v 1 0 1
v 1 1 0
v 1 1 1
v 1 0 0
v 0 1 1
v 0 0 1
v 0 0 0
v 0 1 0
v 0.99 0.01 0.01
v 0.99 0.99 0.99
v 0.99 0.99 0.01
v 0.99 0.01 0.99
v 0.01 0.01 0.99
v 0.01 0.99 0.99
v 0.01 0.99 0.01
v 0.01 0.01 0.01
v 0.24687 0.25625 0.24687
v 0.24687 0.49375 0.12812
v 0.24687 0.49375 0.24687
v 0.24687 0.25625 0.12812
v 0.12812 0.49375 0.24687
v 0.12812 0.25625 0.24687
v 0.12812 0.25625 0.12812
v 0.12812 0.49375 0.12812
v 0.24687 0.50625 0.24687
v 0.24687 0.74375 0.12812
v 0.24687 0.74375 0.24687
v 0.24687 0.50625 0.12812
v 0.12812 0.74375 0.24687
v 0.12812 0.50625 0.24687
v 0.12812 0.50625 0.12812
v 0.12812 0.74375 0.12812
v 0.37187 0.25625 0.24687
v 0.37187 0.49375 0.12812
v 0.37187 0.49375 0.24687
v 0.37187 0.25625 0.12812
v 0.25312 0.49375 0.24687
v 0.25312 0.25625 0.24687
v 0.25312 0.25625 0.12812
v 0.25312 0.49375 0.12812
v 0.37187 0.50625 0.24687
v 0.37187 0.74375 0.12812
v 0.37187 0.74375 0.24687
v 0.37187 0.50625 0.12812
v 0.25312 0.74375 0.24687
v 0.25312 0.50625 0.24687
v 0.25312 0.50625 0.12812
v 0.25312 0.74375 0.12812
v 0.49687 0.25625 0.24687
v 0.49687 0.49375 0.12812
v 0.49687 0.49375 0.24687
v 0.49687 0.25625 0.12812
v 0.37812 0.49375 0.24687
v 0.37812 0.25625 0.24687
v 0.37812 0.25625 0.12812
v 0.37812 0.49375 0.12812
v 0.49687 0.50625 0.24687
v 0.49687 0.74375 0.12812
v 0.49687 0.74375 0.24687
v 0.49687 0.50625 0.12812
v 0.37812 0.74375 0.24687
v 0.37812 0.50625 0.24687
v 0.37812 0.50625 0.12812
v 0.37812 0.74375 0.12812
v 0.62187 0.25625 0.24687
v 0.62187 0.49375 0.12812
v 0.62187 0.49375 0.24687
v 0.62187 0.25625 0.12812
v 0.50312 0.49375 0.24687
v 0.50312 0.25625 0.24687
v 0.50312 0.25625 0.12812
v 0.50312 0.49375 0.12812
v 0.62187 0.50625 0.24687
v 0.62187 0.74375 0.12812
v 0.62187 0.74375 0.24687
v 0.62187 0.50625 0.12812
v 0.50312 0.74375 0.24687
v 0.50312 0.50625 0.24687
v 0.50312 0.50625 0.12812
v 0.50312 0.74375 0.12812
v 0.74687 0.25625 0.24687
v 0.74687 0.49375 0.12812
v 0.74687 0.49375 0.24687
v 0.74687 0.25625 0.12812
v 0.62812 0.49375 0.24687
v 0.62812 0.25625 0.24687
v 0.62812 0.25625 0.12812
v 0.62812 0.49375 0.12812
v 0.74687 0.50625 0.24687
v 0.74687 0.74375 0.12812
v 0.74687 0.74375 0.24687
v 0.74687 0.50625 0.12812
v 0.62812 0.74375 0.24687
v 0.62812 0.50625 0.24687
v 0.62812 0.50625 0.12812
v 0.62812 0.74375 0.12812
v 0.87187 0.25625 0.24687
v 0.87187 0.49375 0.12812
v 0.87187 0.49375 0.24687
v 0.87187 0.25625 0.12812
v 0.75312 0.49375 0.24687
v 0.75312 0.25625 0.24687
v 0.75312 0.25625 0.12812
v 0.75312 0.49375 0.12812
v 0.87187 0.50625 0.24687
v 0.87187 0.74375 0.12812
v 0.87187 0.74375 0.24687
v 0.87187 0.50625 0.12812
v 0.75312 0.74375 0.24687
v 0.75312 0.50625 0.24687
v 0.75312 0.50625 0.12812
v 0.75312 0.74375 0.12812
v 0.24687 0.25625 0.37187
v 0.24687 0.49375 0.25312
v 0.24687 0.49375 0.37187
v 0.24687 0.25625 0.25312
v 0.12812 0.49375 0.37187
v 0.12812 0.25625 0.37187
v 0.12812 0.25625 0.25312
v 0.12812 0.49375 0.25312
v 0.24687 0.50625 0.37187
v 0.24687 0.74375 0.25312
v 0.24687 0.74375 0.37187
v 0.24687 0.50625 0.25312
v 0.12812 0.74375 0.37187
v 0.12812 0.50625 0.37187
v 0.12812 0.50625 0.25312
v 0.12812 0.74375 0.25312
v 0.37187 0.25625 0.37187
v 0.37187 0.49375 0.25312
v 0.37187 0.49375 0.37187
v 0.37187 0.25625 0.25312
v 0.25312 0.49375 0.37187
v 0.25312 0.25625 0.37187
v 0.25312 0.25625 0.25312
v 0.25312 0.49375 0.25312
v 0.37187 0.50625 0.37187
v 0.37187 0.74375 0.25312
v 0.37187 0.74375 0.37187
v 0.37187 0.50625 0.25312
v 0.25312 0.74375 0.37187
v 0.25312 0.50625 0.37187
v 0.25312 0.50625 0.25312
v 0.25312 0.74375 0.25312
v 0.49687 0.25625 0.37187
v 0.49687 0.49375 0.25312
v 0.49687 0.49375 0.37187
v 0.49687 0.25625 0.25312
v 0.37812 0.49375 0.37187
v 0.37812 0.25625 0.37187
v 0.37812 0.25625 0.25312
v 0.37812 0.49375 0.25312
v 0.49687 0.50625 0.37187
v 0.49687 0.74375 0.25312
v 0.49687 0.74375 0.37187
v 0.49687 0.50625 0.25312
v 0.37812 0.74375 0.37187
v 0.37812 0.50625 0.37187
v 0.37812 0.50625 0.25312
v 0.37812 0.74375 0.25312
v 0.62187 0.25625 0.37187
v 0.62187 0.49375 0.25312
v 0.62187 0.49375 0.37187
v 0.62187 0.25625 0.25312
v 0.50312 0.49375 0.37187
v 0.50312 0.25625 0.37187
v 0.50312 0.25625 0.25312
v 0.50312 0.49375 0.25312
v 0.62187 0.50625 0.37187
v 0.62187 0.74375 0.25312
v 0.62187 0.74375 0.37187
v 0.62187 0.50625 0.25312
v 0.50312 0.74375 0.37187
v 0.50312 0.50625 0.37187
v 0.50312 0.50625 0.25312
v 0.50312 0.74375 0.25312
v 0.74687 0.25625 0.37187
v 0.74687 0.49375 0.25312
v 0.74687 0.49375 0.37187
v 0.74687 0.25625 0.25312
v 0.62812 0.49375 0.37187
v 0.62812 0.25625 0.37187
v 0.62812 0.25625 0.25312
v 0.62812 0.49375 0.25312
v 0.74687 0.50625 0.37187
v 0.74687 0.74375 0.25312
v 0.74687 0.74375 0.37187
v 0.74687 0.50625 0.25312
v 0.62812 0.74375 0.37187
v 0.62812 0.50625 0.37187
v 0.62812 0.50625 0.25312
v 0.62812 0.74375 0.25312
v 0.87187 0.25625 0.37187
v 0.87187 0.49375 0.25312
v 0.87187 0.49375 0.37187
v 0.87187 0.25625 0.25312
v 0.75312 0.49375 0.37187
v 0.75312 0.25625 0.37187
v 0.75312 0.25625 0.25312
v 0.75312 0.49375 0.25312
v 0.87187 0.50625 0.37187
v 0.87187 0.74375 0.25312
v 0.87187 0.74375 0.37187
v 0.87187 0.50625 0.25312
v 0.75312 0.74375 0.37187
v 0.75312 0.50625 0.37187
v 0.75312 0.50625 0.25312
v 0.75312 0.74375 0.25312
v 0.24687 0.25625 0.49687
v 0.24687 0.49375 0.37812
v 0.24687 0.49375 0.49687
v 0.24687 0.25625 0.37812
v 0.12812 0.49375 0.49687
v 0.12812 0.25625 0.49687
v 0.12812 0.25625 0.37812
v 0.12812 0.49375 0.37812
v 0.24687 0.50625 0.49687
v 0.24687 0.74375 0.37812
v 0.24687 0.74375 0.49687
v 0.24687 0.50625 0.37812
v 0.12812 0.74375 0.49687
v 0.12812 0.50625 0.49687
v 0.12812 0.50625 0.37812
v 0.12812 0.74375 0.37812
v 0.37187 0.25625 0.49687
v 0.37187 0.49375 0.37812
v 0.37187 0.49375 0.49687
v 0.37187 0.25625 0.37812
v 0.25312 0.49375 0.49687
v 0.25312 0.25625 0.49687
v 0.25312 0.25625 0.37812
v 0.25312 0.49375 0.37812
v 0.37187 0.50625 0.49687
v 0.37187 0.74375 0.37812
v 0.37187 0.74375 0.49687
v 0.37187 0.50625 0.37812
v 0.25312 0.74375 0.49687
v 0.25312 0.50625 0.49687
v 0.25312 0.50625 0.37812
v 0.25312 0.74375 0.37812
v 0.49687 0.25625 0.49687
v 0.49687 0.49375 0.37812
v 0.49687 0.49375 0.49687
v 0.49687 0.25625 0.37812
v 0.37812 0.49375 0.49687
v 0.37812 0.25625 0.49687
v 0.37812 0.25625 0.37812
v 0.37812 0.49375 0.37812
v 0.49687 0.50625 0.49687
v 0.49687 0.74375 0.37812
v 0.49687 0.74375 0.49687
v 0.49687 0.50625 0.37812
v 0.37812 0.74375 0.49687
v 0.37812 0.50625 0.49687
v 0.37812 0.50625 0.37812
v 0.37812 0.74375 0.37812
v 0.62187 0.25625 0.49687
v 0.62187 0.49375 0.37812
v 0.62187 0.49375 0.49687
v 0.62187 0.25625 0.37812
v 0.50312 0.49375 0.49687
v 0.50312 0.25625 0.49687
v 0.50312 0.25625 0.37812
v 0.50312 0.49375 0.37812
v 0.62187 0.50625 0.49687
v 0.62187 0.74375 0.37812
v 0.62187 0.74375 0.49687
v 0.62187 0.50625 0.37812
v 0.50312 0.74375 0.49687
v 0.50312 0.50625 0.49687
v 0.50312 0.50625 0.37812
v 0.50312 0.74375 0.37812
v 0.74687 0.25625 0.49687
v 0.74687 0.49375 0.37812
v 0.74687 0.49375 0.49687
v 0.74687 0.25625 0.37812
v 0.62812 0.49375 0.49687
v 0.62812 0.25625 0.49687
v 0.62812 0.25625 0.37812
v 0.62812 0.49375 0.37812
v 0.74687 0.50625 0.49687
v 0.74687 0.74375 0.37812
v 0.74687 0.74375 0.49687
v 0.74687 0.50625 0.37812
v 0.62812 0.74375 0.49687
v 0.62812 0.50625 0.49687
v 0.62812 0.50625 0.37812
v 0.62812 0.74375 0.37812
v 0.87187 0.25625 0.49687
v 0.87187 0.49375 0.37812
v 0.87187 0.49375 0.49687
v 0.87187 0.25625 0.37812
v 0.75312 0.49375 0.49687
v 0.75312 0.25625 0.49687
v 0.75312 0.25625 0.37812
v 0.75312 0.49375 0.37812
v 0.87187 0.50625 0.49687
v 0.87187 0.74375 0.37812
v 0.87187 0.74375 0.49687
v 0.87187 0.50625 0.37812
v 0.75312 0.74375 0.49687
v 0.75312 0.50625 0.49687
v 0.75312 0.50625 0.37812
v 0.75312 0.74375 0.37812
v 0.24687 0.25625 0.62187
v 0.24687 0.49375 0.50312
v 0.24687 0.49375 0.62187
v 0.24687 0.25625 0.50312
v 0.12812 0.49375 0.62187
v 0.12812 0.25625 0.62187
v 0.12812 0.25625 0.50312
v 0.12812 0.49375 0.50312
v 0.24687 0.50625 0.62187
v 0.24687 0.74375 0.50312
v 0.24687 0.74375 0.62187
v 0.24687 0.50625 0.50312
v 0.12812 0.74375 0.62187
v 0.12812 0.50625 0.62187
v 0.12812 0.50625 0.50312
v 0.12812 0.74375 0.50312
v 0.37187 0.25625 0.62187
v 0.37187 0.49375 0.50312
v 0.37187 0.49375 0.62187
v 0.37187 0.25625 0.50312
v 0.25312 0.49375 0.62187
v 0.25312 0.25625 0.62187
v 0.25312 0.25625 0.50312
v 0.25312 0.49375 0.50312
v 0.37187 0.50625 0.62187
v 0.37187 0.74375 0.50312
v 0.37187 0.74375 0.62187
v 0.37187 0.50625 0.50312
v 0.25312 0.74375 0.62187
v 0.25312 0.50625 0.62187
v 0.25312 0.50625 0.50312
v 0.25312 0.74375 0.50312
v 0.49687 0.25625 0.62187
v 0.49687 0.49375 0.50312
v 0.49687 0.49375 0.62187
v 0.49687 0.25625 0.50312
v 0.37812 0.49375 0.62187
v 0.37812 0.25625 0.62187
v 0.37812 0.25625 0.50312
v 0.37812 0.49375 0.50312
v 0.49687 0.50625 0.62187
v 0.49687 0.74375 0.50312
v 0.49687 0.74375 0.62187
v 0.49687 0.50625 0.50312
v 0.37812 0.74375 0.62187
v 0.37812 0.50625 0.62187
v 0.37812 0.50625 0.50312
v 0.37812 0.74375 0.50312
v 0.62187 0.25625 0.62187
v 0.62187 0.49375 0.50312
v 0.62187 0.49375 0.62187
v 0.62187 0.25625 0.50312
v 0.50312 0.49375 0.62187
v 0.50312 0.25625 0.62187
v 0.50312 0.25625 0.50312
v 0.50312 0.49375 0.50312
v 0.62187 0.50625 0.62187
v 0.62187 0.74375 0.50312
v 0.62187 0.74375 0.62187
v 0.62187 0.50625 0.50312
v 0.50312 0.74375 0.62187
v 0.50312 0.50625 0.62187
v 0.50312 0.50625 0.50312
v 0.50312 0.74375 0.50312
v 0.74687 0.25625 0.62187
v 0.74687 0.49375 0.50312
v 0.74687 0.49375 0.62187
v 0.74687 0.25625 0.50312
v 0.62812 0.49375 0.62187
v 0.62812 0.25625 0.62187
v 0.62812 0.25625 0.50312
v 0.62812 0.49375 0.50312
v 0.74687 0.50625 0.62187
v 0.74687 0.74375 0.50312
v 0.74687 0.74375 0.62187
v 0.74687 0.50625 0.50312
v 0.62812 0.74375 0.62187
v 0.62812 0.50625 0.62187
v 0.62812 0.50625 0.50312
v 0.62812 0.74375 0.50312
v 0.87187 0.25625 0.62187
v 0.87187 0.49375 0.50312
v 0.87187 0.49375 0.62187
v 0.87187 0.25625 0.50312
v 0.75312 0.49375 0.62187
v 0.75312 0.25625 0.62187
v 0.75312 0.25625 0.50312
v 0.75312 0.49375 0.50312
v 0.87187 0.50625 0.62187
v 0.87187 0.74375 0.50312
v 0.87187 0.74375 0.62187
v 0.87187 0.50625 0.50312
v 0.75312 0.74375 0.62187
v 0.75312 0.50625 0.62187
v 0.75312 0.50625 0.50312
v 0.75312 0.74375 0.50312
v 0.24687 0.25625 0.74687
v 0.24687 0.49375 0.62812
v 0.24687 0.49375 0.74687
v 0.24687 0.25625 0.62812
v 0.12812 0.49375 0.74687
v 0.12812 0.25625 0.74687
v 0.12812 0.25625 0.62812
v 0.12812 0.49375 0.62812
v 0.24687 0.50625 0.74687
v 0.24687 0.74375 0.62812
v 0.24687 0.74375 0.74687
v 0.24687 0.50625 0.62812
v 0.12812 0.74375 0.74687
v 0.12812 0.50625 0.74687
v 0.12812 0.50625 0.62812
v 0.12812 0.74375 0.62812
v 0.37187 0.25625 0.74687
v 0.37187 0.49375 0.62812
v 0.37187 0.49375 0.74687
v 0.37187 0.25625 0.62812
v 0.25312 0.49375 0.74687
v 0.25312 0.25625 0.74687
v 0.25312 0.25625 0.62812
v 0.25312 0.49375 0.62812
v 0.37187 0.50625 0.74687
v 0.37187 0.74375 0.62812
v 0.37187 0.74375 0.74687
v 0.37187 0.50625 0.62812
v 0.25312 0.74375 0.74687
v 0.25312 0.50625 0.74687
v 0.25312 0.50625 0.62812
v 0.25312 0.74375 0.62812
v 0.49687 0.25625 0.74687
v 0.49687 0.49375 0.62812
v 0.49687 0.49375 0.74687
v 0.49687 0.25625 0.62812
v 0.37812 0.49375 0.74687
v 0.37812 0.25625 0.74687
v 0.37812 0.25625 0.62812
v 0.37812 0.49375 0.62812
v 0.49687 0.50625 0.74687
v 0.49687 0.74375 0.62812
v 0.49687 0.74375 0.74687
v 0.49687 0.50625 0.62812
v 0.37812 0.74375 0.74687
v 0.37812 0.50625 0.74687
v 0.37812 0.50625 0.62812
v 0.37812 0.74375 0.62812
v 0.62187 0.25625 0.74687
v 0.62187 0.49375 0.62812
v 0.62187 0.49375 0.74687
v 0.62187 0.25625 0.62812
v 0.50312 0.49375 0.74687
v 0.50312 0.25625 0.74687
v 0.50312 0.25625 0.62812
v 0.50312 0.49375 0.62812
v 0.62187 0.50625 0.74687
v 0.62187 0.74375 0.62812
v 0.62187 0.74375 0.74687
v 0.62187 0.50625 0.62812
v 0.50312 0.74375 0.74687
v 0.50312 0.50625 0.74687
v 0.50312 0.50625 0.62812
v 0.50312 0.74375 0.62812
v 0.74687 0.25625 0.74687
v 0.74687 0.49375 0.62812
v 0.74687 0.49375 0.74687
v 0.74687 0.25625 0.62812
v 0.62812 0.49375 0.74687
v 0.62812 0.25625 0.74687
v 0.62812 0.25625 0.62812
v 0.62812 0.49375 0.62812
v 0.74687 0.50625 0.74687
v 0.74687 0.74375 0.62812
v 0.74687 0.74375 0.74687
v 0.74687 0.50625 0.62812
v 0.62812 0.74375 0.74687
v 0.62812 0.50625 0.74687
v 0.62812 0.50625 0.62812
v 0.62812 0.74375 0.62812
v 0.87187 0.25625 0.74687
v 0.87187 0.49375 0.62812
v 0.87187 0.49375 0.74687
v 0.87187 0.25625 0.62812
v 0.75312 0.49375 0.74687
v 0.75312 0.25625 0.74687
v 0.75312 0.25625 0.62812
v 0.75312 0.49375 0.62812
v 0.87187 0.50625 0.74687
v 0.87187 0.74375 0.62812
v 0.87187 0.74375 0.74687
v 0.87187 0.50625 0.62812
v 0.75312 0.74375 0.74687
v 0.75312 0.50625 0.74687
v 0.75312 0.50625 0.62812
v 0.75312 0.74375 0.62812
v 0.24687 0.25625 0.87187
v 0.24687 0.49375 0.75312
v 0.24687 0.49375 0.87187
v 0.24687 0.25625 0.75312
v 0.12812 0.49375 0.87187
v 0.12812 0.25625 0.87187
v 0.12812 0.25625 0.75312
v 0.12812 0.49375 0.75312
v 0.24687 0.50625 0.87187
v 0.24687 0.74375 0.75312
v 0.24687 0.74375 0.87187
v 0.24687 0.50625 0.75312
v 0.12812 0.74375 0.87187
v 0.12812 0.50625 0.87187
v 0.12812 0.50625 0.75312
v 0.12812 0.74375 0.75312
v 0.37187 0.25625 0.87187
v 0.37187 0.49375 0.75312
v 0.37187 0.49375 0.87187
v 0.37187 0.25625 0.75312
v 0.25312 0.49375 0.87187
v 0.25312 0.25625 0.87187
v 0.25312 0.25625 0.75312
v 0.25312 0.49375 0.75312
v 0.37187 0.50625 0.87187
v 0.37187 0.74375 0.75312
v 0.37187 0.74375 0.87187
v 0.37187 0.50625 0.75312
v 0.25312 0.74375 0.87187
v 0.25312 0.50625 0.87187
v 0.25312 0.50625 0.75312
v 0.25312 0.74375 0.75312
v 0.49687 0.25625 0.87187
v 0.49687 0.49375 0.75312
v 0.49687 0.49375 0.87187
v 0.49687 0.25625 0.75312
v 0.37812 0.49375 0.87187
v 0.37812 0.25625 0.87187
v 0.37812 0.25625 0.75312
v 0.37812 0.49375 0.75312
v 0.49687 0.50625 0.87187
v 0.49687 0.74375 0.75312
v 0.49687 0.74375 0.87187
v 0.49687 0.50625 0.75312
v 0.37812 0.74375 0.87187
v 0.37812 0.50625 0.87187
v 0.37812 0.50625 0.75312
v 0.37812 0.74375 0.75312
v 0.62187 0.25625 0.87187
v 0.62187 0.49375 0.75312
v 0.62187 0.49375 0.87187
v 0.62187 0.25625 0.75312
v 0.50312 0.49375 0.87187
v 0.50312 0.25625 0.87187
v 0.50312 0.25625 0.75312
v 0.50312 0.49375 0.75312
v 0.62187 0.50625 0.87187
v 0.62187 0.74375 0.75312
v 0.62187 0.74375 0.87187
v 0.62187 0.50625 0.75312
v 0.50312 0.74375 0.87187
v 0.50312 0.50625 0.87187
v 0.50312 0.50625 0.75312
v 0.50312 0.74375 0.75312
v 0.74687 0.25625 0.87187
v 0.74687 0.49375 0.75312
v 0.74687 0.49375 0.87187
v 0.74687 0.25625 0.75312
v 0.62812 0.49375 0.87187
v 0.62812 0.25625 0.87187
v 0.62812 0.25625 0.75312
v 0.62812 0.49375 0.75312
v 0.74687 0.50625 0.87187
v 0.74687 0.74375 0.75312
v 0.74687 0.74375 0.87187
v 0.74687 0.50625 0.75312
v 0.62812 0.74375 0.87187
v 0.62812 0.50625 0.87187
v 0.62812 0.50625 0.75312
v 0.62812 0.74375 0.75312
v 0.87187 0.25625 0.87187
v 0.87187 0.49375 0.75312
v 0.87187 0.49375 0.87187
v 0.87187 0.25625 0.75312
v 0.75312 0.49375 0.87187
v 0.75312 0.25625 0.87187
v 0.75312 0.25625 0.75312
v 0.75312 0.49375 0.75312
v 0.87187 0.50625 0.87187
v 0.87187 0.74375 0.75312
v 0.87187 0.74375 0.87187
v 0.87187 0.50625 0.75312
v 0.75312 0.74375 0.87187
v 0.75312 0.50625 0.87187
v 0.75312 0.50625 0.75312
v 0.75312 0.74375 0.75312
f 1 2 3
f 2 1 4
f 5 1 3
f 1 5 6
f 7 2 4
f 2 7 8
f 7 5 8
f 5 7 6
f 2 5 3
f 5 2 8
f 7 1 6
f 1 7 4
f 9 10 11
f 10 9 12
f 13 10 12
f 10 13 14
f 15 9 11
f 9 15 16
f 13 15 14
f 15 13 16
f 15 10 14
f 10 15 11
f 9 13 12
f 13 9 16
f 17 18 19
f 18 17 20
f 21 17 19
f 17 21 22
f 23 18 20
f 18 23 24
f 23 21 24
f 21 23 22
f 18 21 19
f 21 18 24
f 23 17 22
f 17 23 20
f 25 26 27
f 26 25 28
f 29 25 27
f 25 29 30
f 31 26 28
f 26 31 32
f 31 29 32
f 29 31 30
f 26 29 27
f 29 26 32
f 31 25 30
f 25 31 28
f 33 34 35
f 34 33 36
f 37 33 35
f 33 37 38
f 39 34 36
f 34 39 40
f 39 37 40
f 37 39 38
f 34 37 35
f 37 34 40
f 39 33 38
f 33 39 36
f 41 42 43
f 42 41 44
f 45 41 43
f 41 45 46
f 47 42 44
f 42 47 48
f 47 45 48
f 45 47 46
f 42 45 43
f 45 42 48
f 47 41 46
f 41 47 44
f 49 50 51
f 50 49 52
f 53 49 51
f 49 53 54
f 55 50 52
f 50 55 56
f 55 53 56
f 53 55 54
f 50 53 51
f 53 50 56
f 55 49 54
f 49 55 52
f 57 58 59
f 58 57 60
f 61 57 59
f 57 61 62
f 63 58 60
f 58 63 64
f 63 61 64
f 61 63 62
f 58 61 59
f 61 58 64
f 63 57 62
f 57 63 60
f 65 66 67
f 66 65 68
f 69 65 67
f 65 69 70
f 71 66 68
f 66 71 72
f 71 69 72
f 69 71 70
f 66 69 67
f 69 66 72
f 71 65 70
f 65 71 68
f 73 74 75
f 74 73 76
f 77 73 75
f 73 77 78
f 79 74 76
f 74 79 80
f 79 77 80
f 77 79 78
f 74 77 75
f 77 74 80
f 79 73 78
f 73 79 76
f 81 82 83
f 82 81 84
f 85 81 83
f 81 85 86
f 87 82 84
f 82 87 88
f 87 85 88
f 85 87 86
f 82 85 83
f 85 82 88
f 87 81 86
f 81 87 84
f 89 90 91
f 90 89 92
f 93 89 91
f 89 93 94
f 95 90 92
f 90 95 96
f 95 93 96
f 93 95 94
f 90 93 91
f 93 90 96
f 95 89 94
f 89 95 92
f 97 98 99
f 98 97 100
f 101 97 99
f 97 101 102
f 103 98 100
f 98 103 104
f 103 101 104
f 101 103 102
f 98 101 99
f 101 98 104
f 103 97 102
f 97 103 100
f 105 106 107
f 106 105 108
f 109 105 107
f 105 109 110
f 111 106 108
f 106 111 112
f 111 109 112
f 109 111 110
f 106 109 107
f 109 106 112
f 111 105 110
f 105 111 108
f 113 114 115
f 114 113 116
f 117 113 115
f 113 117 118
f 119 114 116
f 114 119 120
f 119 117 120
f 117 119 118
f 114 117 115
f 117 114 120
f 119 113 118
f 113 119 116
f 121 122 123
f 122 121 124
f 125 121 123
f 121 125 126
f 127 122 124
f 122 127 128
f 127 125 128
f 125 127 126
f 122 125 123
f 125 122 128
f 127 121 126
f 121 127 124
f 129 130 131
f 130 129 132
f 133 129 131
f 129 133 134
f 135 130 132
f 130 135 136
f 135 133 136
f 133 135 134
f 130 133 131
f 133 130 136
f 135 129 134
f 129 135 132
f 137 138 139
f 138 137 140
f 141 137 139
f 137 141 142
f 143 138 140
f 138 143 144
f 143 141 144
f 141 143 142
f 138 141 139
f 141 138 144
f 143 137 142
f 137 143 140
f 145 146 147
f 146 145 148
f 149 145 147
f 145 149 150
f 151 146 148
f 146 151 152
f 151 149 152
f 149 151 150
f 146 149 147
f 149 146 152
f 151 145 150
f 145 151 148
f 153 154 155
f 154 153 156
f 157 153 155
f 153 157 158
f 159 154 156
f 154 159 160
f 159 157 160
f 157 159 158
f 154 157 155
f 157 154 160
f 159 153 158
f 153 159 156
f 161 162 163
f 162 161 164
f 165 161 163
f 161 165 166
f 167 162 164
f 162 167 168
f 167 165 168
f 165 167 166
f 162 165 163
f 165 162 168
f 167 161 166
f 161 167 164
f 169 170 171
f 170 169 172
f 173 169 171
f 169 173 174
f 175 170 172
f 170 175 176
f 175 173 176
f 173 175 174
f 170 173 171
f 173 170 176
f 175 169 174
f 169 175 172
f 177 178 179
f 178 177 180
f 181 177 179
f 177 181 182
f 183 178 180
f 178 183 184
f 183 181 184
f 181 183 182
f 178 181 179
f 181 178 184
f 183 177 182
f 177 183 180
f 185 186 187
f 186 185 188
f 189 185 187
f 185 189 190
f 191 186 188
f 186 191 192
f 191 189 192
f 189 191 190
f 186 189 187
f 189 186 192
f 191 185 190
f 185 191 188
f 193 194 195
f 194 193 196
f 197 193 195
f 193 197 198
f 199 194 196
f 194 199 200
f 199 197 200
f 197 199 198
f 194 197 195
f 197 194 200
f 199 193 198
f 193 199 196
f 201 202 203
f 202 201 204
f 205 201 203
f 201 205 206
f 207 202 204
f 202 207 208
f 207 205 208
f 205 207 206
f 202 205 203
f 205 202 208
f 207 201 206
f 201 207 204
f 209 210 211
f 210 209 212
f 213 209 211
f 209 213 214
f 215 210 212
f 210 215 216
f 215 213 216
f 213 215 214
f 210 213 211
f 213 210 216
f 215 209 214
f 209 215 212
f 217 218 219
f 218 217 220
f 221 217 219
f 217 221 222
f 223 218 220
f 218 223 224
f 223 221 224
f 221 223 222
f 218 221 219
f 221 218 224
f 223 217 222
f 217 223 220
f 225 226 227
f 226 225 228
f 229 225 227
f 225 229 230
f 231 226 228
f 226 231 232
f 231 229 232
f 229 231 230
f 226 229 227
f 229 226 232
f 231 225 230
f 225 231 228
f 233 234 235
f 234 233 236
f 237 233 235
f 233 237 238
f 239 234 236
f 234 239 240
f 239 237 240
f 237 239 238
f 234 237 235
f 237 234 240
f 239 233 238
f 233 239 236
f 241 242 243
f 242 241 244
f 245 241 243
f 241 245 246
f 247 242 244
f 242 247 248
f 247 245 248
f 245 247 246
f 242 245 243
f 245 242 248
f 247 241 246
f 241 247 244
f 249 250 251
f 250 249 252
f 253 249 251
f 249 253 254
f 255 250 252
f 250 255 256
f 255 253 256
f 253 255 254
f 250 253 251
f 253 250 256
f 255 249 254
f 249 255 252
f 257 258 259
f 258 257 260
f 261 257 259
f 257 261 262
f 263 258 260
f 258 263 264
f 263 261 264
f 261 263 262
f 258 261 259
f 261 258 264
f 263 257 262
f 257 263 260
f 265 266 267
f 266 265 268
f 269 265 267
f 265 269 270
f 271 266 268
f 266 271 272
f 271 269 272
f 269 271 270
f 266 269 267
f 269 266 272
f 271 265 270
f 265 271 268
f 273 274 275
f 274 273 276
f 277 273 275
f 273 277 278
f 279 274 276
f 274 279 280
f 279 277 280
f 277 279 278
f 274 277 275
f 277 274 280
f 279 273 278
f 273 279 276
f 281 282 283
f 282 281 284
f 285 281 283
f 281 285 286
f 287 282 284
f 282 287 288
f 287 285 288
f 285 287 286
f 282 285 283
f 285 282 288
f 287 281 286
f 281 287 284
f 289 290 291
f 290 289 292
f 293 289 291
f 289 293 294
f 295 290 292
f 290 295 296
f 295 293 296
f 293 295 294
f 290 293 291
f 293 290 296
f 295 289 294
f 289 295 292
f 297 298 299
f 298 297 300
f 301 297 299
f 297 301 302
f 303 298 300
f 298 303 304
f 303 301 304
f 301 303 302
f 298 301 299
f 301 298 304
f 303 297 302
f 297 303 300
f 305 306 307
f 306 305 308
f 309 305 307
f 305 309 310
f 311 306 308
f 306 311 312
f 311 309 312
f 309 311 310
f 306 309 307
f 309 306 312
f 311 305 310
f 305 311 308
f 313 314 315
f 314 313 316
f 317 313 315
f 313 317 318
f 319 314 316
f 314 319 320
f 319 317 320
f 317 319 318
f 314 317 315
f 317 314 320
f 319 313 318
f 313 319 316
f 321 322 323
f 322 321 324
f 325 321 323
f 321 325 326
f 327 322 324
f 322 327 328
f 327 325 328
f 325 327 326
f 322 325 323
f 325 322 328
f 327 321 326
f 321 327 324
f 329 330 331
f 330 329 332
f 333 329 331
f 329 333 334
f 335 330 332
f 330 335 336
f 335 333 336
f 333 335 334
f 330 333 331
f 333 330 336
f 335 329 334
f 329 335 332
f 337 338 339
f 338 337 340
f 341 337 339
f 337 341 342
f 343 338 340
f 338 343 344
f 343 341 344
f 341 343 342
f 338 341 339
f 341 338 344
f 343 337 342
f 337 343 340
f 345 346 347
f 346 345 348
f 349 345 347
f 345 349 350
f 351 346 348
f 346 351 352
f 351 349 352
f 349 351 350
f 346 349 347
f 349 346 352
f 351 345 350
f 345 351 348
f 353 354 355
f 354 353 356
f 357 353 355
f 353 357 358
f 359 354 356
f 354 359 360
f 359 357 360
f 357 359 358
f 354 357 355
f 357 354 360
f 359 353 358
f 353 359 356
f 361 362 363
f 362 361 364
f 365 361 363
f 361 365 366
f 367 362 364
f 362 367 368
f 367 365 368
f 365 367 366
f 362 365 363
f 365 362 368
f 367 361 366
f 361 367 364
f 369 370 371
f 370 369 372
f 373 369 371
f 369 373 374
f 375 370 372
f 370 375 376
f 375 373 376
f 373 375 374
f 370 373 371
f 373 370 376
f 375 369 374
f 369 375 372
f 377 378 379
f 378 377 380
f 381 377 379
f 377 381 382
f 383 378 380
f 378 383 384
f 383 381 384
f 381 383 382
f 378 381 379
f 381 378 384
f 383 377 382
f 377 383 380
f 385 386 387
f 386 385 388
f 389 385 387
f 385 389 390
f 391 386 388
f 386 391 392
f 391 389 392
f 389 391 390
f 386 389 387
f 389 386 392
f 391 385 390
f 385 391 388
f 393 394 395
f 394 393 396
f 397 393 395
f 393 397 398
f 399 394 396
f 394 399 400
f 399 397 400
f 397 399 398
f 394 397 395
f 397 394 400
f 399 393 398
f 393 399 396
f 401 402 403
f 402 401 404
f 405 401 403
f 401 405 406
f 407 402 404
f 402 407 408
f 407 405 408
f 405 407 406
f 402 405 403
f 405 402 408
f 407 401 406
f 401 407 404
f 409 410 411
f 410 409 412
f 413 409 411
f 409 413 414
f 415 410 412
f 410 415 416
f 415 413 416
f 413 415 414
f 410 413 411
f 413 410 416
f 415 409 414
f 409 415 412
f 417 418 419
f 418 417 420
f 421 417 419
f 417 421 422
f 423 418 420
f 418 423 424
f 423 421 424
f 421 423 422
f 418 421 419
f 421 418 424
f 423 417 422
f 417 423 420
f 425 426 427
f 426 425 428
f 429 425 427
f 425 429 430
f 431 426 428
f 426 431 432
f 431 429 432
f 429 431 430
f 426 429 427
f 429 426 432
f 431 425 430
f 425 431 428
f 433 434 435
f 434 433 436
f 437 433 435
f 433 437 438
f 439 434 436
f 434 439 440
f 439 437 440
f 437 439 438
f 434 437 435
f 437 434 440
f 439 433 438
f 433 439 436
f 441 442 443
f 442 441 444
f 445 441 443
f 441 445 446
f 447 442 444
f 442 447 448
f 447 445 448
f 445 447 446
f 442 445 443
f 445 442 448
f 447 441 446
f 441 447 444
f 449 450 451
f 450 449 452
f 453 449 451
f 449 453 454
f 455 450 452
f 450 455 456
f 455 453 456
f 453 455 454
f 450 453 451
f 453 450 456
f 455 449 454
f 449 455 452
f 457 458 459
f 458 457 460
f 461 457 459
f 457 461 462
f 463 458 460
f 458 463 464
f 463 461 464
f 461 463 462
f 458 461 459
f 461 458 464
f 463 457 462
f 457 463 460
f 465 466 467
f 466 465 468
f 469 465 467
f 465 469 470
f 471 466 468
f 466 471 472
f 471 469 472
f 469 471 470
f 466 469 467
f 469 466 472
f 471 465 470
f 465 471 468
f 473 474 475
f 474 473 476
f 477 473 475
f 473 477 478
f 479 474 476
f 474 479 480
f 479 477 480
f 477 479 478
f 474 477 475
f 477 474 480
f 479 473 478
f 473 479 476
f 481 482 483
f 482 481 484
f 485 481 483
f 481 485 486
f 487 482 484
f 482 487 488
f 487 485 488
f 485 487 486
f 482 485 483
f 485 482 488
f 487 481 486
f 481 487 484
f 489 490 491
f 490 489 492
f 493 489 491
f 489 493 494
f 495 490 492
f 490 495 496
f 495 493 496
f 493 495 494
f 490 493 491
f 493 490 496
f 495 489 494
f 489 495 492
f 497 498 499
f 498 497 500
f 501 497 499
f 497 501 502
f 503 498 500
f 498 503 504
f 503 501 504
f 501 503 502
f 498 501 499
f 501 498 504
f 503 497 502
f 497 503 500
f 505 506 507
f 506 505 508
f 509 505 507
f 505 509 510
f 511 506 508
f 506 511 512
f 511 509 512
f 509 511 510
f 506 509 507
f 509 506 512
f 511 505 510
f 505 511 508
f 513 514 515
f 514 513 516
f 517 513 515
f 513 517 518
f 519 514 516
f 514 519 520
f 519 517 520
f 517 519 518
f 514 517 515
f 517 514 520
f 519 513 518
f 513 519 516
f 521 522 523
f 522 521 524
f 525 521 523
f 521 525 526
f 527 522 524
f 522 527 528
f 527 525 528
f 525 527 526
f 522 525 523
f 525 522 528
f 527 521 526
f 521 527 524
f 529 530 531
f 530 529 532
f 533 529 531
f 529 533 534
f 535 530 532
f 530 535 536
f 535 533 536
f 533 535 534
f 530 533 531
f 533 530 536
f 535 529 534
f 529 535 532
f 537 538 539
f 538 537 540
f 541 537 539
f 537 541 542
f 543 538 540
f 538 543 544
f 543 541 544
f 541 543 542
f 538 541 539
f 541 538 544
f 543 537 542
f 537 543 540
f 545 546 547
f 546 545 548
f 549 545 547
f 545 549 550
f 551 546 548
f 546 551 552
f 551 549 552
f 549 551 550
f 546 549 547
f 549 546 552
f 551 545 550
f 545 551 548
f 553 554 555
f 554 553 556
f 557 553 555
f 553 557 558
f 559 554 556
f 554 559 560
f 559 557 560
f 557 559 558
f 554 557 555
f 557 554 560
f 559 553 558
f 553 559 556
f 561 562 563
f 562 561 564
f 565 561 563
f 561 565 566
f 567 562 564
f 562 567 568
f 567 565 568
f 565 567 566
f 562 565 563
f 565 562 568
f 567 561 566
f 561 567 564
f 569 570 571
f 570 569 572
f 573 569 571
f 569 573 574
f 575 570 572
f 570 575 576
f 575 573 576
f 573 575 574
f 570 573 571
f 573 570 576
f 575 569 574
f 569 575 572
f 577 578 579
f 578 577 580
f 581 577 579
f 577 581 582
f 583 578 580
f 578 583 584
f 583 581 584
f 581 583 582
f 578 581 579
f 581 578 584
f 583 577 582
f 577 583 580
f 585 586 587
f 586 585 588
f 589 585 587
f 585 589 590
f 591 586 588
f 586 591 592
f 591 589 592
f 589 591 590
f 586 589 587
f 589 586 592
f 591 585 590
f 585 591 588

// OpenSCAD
translate([0.1875, 0.375, 0.1875]) color([0.5722195718955865, 0.184217002063086, 0.8342118832051438]) cube([0.11875, 0.2375, 0.11875], center=true);
translate([0.1875, 0.625, 0.1875]) color([0.26710224400295624, 0.08508716760269452, 0.3457541811054926]) cube([0.11875, 0.2375, 0.11875], center=true);
translate([0.3125, 0.375, 0.1875]) color([0.07476171000851672, 0.19279916790285045, 0.5504615810891126]) cube([0.11875, 0.2375, 0.11875], center=true);
translate([0.3125, 0.625, 0.1875]) color([0.09079597065111733, 0.40484827153990854, 0.7007931535607755]) cube([0.11875, 0.2375, 0.11875], center=true);
translate([0.4375, 0.375, 0.1875]) color([0.49403525384706204, 0.6510047853558598, 0.6429337830402005]) cube([0.11875, 0.2375, 0.11875], center=true);
translate([0.4375, 0.625, 0.1875]) color([0.2649187298750757, 0.27572483708494266, 0.5473052205769033]) cube([0.11875, 0.2375, 0.11875], center=true);
translate([0.5625, 0.375, 0.1875]) color([0.5661495725987926, 0.874404803529036, 0.20386709790345137]) cube([0.11875, 0.2375, 0.11875], center=true);
translate([0.5625, 0.625, 0.1875]) color([0.3418305511940324, 0.8878875246484472, 0.2801861345901735]) cube([0.11875, 0.2375, 0.11875], center=true);
translate([0.6875, 0.375, 0.1875]) color([0.1546149601754332, 0.3469401204031036, 0.3758367769097771]) cube([0.11875, 0.2375, 0.11875], center=true);
translate([0.6875, 0.625, 0.1875]) color([0.5318168981553145, 0.09181654034718201, 0.15494961168900667]) cube([0.11875, 0.2375, 0.11875], center=true);
translate([0.8125, 0.375, 0.1875]) color([0.23634427521391044, 0.3704107832232806, 0.487539209689296]) cube([0.11875, 0.2375, 0.11875], center=true);
translate([0.8125, 0.625, 0.1875]) color([0.6034976542650747, 0.2627310794437595, 0.4813767342813645]) cube([0.11875, 0.2375, 0.11875], center=true);
translate([0.1875, 0.375, 0.3125]) color([0.5946463261514235, 0.5048272534170117, 0.16573815981186668]) cube([0.11875, 0.2375, 0.11875], center=true);
translate([0.1875, 0.625, 0.3125]) color([0.5312064721990213, 0.3864707385879014, 0.6491346940979981]) cube([0.11875, 0.2375, 0.11875], center=true);
translate([0.3125, 0.375, 0.3125]) color([0.6930379086396479, 0.4966939974314175, 0.6630315309986013]) cube([0.11875, 0.2375, 0.11875], center=true);
translate([0.3125, 0.625, 0.3125]) color([0.13981308963283157, 0.47491123508258415, 0.9023476457984115]) cube([0.11875, 0.2375, 0.11875], center=true);
translate([0.4375, 0.375, 0.3125]) color([0.1931726699934797, 0.0031613604210096735, 0.6942741873712196]) cube([0.11875, 0.2375, 0.11875], center=true);
translate([0.4375, 0.625, 0.3125]) color([0.4143523561114393, 0.3646706267694394, 0.09478866737710545]) cube([0.11875, 0.2375, 0.11875], center=true);
translate([0.5625, 0.375, 0.3125]) color([0.02952248278908587, 0.06577547335008205, 0.2144514008829076]) cube([0.11875, 0.2375, 0.11875], center=true);
translate([0.5625, 0.625, 0.3125]) color([0.7343352544312742, 0.603990958460556, 0.9720313042525073]) cube([0.11875, 0.2375, 0.11875], center=true);
translate([0.6875, 0.375, 0.3125]) color([0.7807972976434698, 0.7764498464372257, 0.921763141345221]) cube([0.11875, 0.2375, 0.11875], center=true);
translate([0.6875, 0.625, 0.3125]) color([0.057080613367743394, 0.9909538408677715, 0.5964250008993118]) cube([0.11875, 0.2375, 0.11875], center=true);
translate([0.8125, 0.375, 0.3125]) color([0.07889841000546927, 0.7028197923162828, 0.6308852981512154]) cube([0.11875, 0.2375, 0.11875], center=true);
translate([0.8125, 0.625, 0.3125]) color([0.9993671244921081, 0.6127248764917053, 0.8343703456684616]) cube([0.11875, 0.2375, 0.11875], center=true);
translate([0.1875, 0.375, 0.4375]) color([0.37764138660031277, 0.7740498451771767, 0.4727699991249097]) cube([0.11875, 0.2375, 0.11875], center=true);
translate([0.1875, 0.625, 0.4375]) color([0.42951117613533696, 0.4948057107933499, 0.6721242531863842]) cube([0.11875, 0.2375, 0.11875], center=true);
translate([0.3125, 0.375, 0.4375]) color([0.4041489968292017, 0.6081990332733349, 0.10592311435848989]) cube([0.11875, 0.2375, 0.11875], center=true);
translate([0.3125, 0.625, 0.4375]) color([0.17046457513355695, 0.68509640591202, 0.25832902758732756]) cube([0.11875, 0.2375, 0.11875], center=true);
translate([0.4375, 0.375, 0.4375]) color([0.5827166907330694, 0.9734780100360324, 0.5142753815107834]) cube([0.11875, 0.2375, 0.11875], center=true);
translate([0.4375, 0.625, 0.4375]) color([0.8518460407990305, 0.7921792124086715, 0.9242627687794138]) cube([0.11875, 0.2375, 0.11875], center=true);
translate([0.5625, 0.375, 0.4375]) color([0.4222989312329084, 0.8256043248591103, 0.6866368897678596]) cube([0.11875, 0.2375, 0.11875], center=true);
translate([0.5625, 0.625, 0.4375]) color([0.07026289121596807, 0.39450476415211355, 0.03805223835591409]) cube([0.11875, 0.2375, 0.11875], center=true);
translate([0.6875, 0.375, 0.4375]) color([0.21392472046875743, 0.9792602350388848, 0.8429065760788597]) cube([0.11875, 0.2375, 0.11875], center=true);
translate([0.6875, 0.625, 0.4375]) color([0.6701422863970856, 0.8038308470714224, 0.5026650287362939]) cube([0.11875, 0.2375, 0.11875], center=true);
translate([0.8125, 0.375, 0.4375]) color([0.7005302097472288, 0.42543181796635976, 0.039532572887805095]) cube([0.11875, 0.2375, 0.11875], center=true);
translate([0.8125, 0.625, 0.4375]) color([0.3501329427386275, 0.5613665040074035, 0.676966896884483]) cube([0.11875, 0.2375, 0.11875], center=true);
translate([0.1875, 0.375, 0.5625]) color([0.9415503582821488, 0.638422054927918, 0.982832446671283]) cube([0.11875, 0.2375, 0.11875], center=true);
translate([0.1875, 0.625, 0.5625]) color([0.22242697558850177, 0.20337745933762919, 0.8396320261254964]) cube([0.11875, 0.2375, 0.11875], center=true);
translate([0.3125, 0.375, 0.5625]) color([0.8581974504323758, 0.12468167769970973, 0.5860586165551435]) cube([0.11875, 0.2375, 0.11875], center=true);
translate([0.3125, 0.625, 0.5625]) color([0.6372345767045206, 0.41448714979929746, 0.33466164453281544]) cube([0.11875, 0.2375, 0.11875], center=true);
translate([0.4375, 0.375, 0.5625]) color([0.14615425974516127, 0.5125022699976917, 0.9499404793473203]) cube([0.11875, 0.2375, 0.11875], center=true);
translate([0.4375, 0.625, 0.5625]) color([0.30615895288986783, 0.22836314297469162, 0.14180015303446913]) cube([0.11875, 0.2375, 0.11875], center=true);
translate([0.5625, 0.375, 0.5625]) color([0.4254520170537529, 0.7022324265459632, 0.6260701672943275]) cube([0.11875, 0.2375, 0.11875], center=true);
translate([0.5625, 0.625, 0.5625]) color([0.6766726783873931, 0.27037562329117093, 0.7996228729240792]) cube([0.11875, 0.2375, 0.11875], center=true);
translate([0.6875, 0.375, 0.5625]) color([0.1689776241723807, 0.8092335790219731, 0.07131052197261811]) cube([0.11875, 0.2375, 0.11875], center=true);
translate([0.6875, 0.625, 0.5625]) color([0.9167045329336965, 0.07355687243231801, 0.010759652483627535]) cube([0.11875, 0.2375, 0.11875], center=true);
translate([0.8125, 0.375, 0.5625]) color([0.2653293678056491, 0.17962355134913344, 0.06705044189692677]) cube([0.11875, 0.2375, 0.11875], center=true);
translate([0.8125, 0.625, 0.5625]) color([0.40432173971376406, 0.15213179511413832, 0.06994619531703306]) cube([0.11875, 0.2375, 0.11875], center=true);
translate([0.1875, 0.375, 0.6875]) color([0.39418544212029294, 0.832106956784393, 0.9013853532064491]) cube([0.11875, 0.2375, 0.11875], center=true);
translate([0.1875, 0.625, 0.6875]) color([0.45636865842402685, 0.7426317102292569, 0.18563403973556636]) cube([0.11875, 0.2375, 0.11875], center=true);
translate([0.3125, 0.375, 0.6875]) color([0.2591742256971371, 0.3713942695201138, 0.3255709291826001]) cube([0.11875, 0.2375, 0.11875], center=true);
translate([0.3125, 0.625, 0.6875]) color([0.9668519148648065, 0.15035976518987737, 0.07126993591970932]) cube([0.11875, 0.2375, 0.11875], center=true);
translate([0.4375, 0.375, 0.6875]) color([0.022263854380737413, 0.6448032955168772, 0.7054365188432518]) cube([0.11875, 0.2375, 0.11875], center=true);
translate([0.4375, 0.625, 0.6875]) color([0.18989364163012878, 0.9095796956970004, 0.2866992175752643]) cube([0.11875, 0.2375, 0.11875], center=true);
translate([0.5625, 0.375, 0.6875]) color([0.016796355328543733, 0.9853949309588352, 0.20639871589358572]) cube([0.11875, 0.2375, 0.11875], center=true);
translate([0.5625, 0.625, 0.6875]) color([0.9418806051562687, 0.5105416283485175, 0.11829637917642077]) cube([0.11875, 0.2375, 0.11875], center=true);
translate([0.6875, 0.375, 0.6875]) color([0.0331434177773291, 0.9716949682419498, 0.5120755960622546]) cube([0.11875, 0.2375, 0.11875], center=true);
translate([0.6875, 0.625, 0.6875]) color([0.5699620205657183, 0.5212764357749088, 0.8040193337778497]) cube([0.11875, 0.2375, 0.11875], center=true);
translate([0.8125, 0.375, 0.6875]) color([0.3012338165570252, 0.8770869334393367, 0.07381657990193236]) cube([0.11875, 0.2375, 0.11875], center=true);
translate([0.8125, 0.625, 0.6875]) color([0.2585418425703794, 0.8156371793201017, 0.9297366234651161]) cube([0.11875, 0.2375, 0.11875], center=true);
translate([0.1875, 0.375, 0.8125]) color([0.35162482636677683, 0.5737410708630823, 0.3420286742625852]) cube([0.11875, 0.2375, 0.11875], center=true);
translate([0.1875, 0.625, 0.8125]) color([0.8602517486666666, 0.39378970769830157, 0.07803417986157579]) cube([0.11875, 0.2375, 0.11875], center=true);
translate([0.3125, 0.375, 0.8125]) color([0.5152805346445746, 0.37115974681287345, 0.5492489526705956]) cube([0.11875, 0.2375, 0.11875], center=true);
translate([0.3125, 0.625, 0.8125]) color([0.9808001599744051, 0.44354590849136977, 0.42327326038233215]) cube([0.11875, 0.2375, 0.11875], center=true);
translate([0.4375, 0.375, 0.8125]) color([0.7652204076937128, 0.12458901002307665, 0.21814311818648102]) cube([0.11875, 0.2375, 0.11875], center=true);
translate([0.4375, 0.625, 0.8125]) color([0.34928122557175134, 0.9102340390409834, 0.40420071373254374]) cube([0.11875, 0.2375, 0.11875], center=true);
translate([0.5625, 0.375, 0.8125]) color([0.23831380232737853, 0.2826951275902514, 0.5208976892385044]) cube([0.11875, 0.2375, 0.11875], center=true);
translate([0.5625, 0.625, 0.8125]) color([0.49923785613356464, 0.46804999818571347, 0.1092299898690654]) cube([0.11875, 0.2375, 0.11875], center=true);
translate([0.6875, 0.375, 0.8125]) color([0.8588263781496424, 0.10604194887936225, 0.8147438933323847]) cube([0.11875, 0.2375, 0.11875], center=true);
translate([0.6875, 0.625, 0.8125]) color([0.3232409344612869, 0.20619810517781745, 0.9901766936244019]) cube([0.11875, 0.2375, 0.11875], center=true);
translate([0.8125, 0.375, 0.8125]) color([0.20019140638761446, 0.7845685226083772, 0.7658277185955238]) cube([0.11875, 0.2375, 0.11875], center=true);
translate([0.8125, 0.625, 0.8125]) color([0.10260713645343533, 0.1525821955329013, 0.5073229901225781]) cube([0.11875, 0.2375, 0.11875], center=true);
color([0.3,0.3,0.3,0.3]) difference() { cube([1,1,1]); translate([0.01,0.01,0.01]) cube([0.98,0.98,0.98]); }
